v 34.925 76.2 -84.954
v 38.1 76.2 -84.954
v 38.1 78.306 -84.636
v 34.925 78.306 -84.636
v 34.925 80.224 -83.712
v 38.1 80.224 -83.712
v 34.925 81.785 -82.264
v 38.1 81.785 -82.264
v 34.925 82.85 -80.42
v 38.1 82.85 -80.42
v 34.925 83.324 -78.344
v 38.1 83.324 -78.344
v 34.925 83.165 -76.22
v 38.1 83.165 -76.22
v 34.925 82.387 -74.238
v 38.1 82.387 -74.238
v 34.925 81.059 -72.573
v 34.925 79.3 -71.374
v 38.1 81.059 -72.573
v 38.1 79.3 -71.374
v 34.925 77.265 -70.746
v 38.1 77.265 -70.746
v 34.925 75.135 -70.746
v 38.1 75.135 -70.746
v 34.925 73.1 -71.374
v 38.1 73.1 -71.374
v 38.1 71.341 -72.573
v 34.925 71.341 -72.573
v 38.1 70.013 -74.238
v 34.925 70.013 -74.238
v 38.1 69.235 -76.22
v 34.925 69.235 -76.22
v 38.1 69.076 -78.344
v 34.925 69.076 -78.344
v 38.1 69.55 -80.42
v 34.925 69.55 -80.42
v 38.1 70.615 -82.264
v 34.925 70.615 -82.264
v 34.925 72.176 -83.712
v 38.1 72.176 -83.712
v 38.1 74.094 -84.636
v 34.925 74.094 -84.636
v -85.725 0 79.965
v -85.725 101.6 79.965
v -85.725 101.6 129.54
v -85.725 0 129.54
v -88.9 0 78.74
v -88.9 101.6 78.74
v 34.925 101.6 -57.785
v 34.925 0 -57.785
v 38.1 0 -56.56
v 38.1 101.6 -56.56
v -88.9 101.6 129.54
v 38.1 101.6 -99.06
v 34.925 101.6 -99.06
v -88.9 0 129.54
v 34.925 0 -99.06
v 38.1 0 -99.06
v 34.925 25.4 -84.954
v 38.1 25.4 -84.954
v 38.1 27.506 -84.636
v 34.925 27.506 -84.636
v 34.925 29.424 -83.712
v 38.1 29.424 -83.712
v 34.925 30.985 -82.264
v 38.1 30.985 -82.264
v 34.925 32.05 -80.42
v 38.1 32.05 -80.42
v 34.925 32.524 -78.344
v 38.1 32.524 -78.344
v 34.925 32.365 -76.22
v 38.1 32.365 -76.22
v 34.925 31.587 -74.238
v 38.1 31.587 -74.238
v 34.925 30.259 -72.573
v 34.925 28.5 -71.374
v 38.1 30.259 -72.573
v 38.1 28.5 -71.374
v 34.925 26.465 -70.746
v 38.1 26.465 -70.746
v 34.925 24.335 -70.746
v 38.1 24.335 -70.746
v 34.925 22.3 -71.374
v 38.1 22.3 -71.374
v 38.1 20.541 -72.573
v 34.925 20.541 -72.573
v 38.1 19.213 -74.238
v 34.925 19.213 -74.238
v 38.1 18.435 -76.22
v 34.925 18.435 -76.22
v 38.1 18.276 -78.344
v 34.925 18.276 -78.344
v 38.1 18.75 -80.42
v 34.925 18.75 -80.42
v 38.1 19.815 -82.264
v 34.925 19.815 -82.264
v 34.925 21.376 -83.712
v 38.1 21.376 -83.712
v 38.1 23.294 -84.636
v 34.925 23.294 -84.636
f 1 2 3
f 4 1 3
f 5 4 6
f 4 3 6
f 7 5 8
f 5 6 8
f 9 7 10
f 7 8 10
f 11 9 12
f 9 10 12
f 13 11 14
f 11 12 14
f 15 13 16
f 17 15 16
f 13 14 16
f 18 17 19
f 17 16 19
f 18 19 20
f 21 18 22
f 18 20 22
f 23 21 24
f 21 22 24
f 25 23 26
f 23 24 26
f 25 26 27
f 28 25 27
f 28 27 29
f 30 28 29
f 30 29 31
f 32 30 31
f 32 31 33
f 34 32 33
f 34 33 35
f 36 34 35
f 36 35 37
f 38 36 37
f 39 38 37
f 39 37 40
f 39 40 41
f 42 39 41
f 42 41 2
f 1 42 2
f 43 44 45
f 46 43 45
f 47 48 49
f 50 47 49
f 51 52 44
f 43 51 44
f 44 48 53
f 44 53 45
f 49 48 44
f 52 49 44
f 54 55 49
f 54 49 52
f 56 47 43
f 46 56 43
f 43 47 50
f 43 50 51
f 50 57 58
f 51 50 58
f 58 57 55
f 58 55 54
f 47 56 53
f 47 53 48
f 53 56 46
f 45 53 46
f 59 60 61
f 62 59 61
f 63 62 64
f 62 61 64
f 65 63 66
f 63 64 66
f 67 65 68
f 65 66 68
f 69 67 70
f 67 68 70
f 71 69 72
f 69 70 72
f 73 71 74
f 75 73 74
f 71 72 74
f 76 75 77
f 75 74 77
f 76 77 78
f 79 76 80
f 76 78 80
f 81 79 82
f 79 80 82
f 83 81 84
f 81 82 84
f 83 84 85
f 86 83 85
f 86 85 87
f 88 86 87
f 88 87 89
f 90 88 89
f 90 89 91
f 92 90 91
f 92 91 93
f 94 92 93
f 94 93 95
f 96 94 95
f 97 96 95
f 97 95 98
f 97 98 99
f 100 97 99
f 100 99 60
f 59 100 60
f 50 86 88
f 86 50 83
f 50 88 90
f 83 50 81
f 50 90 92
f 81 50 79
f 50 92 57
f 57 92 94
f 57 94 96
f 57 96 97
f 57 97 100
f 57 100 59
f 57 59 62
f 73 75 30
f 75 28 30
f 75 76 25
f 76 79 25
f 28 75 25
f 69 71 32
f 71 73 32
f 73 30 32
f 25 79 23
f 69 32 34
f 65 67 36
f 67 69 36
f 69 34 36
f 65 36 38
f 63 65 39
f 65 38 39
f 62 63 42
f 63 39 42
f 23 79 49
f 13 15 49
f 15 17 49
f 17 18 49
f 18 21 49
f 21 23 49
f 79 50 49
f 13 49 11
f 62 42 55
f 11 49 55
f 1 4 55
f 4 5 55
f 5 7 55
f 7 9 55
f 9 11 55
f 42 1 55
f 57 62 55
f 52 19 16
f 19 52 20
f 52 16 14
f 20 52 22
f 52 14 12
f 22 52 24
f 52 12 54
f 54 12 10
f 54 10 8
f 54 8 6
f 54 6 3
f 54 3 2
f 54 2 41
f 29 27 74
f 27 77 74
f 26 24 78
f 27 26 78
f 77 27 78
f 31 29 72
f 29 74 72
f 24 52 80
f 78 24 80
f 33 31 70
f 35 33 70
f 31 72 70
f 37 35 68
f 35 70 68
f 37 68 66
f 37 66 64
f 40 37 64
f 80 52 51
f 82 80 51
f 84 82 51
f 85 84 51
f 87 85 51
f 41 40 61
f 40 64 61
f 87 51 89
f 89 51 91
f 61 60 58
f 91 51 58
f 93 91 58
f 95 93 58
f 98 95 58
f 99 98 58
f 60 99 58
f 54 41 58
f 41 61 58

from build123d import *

# Parameters (mm, degrees)
SKETCH1_W           = 127
SKETCH1_H           = 228.6
BOSS_EXTRUDE1_DEPTH = 101.6
CUT_EXTRUDE3_DEPTH  = 188.099924105
SKETCH6_R           = 7.14375
CUT_EXTRUDE4_DEPTH  = 101.6


with BuildPart() as part:
    # Sketch1 → Boss-Extrude1 (new body)
    with BuildSketch(Plane(origin=(0, 0, 0), x_dir=(1, 0, 0), z_dir=(0, 1, 0))):
        with Locations((-25.4, -15.24)):
            Rectangle(SKETCH1_W, SKETCH1_H)
    extrude(amount=BOSS_EXTRUDE1_DEPTH)

    # Sketch3 → Cut-Extrude3 (cut, through all)
    with BuildSketch(Plane(origin=(0, 101.6, 0), x_dir=(1, 0, 0), z_dir=(0, 1, 0))):
        Polygon((34.925, 57.785), (34.925, 99.06), (-88.9, 99.06), (-88.9, -78.74), align=None)
        Polygon((38.1, -129.54), (38.1, 56.559637154), (-85.725, -79.965362846), (-85.725, -129.54), align=None)
    extrude(amount=-CUT_EXTRUDE3_DEPTH, mode=Mode.SUBTRACT)

    # Sketch6 → Cut-Extrude4 (cut)
    with BuildSketch(Plane(origin=(38.1, 0, 0), x_dir=(0, 0, -1), z_dir=(1, 0, 0))):
        with Locations((77.809818577, 76.2)):
            Circle(SKETCH6_R)
        with Locations((77.809818577, 25.4)):
            Circle(SKETCH6_R)
    extrude(amount=-CUT_EXTRUDE4_DEPTH, mode=Mode.SUBTRACT)


solid = part.part
